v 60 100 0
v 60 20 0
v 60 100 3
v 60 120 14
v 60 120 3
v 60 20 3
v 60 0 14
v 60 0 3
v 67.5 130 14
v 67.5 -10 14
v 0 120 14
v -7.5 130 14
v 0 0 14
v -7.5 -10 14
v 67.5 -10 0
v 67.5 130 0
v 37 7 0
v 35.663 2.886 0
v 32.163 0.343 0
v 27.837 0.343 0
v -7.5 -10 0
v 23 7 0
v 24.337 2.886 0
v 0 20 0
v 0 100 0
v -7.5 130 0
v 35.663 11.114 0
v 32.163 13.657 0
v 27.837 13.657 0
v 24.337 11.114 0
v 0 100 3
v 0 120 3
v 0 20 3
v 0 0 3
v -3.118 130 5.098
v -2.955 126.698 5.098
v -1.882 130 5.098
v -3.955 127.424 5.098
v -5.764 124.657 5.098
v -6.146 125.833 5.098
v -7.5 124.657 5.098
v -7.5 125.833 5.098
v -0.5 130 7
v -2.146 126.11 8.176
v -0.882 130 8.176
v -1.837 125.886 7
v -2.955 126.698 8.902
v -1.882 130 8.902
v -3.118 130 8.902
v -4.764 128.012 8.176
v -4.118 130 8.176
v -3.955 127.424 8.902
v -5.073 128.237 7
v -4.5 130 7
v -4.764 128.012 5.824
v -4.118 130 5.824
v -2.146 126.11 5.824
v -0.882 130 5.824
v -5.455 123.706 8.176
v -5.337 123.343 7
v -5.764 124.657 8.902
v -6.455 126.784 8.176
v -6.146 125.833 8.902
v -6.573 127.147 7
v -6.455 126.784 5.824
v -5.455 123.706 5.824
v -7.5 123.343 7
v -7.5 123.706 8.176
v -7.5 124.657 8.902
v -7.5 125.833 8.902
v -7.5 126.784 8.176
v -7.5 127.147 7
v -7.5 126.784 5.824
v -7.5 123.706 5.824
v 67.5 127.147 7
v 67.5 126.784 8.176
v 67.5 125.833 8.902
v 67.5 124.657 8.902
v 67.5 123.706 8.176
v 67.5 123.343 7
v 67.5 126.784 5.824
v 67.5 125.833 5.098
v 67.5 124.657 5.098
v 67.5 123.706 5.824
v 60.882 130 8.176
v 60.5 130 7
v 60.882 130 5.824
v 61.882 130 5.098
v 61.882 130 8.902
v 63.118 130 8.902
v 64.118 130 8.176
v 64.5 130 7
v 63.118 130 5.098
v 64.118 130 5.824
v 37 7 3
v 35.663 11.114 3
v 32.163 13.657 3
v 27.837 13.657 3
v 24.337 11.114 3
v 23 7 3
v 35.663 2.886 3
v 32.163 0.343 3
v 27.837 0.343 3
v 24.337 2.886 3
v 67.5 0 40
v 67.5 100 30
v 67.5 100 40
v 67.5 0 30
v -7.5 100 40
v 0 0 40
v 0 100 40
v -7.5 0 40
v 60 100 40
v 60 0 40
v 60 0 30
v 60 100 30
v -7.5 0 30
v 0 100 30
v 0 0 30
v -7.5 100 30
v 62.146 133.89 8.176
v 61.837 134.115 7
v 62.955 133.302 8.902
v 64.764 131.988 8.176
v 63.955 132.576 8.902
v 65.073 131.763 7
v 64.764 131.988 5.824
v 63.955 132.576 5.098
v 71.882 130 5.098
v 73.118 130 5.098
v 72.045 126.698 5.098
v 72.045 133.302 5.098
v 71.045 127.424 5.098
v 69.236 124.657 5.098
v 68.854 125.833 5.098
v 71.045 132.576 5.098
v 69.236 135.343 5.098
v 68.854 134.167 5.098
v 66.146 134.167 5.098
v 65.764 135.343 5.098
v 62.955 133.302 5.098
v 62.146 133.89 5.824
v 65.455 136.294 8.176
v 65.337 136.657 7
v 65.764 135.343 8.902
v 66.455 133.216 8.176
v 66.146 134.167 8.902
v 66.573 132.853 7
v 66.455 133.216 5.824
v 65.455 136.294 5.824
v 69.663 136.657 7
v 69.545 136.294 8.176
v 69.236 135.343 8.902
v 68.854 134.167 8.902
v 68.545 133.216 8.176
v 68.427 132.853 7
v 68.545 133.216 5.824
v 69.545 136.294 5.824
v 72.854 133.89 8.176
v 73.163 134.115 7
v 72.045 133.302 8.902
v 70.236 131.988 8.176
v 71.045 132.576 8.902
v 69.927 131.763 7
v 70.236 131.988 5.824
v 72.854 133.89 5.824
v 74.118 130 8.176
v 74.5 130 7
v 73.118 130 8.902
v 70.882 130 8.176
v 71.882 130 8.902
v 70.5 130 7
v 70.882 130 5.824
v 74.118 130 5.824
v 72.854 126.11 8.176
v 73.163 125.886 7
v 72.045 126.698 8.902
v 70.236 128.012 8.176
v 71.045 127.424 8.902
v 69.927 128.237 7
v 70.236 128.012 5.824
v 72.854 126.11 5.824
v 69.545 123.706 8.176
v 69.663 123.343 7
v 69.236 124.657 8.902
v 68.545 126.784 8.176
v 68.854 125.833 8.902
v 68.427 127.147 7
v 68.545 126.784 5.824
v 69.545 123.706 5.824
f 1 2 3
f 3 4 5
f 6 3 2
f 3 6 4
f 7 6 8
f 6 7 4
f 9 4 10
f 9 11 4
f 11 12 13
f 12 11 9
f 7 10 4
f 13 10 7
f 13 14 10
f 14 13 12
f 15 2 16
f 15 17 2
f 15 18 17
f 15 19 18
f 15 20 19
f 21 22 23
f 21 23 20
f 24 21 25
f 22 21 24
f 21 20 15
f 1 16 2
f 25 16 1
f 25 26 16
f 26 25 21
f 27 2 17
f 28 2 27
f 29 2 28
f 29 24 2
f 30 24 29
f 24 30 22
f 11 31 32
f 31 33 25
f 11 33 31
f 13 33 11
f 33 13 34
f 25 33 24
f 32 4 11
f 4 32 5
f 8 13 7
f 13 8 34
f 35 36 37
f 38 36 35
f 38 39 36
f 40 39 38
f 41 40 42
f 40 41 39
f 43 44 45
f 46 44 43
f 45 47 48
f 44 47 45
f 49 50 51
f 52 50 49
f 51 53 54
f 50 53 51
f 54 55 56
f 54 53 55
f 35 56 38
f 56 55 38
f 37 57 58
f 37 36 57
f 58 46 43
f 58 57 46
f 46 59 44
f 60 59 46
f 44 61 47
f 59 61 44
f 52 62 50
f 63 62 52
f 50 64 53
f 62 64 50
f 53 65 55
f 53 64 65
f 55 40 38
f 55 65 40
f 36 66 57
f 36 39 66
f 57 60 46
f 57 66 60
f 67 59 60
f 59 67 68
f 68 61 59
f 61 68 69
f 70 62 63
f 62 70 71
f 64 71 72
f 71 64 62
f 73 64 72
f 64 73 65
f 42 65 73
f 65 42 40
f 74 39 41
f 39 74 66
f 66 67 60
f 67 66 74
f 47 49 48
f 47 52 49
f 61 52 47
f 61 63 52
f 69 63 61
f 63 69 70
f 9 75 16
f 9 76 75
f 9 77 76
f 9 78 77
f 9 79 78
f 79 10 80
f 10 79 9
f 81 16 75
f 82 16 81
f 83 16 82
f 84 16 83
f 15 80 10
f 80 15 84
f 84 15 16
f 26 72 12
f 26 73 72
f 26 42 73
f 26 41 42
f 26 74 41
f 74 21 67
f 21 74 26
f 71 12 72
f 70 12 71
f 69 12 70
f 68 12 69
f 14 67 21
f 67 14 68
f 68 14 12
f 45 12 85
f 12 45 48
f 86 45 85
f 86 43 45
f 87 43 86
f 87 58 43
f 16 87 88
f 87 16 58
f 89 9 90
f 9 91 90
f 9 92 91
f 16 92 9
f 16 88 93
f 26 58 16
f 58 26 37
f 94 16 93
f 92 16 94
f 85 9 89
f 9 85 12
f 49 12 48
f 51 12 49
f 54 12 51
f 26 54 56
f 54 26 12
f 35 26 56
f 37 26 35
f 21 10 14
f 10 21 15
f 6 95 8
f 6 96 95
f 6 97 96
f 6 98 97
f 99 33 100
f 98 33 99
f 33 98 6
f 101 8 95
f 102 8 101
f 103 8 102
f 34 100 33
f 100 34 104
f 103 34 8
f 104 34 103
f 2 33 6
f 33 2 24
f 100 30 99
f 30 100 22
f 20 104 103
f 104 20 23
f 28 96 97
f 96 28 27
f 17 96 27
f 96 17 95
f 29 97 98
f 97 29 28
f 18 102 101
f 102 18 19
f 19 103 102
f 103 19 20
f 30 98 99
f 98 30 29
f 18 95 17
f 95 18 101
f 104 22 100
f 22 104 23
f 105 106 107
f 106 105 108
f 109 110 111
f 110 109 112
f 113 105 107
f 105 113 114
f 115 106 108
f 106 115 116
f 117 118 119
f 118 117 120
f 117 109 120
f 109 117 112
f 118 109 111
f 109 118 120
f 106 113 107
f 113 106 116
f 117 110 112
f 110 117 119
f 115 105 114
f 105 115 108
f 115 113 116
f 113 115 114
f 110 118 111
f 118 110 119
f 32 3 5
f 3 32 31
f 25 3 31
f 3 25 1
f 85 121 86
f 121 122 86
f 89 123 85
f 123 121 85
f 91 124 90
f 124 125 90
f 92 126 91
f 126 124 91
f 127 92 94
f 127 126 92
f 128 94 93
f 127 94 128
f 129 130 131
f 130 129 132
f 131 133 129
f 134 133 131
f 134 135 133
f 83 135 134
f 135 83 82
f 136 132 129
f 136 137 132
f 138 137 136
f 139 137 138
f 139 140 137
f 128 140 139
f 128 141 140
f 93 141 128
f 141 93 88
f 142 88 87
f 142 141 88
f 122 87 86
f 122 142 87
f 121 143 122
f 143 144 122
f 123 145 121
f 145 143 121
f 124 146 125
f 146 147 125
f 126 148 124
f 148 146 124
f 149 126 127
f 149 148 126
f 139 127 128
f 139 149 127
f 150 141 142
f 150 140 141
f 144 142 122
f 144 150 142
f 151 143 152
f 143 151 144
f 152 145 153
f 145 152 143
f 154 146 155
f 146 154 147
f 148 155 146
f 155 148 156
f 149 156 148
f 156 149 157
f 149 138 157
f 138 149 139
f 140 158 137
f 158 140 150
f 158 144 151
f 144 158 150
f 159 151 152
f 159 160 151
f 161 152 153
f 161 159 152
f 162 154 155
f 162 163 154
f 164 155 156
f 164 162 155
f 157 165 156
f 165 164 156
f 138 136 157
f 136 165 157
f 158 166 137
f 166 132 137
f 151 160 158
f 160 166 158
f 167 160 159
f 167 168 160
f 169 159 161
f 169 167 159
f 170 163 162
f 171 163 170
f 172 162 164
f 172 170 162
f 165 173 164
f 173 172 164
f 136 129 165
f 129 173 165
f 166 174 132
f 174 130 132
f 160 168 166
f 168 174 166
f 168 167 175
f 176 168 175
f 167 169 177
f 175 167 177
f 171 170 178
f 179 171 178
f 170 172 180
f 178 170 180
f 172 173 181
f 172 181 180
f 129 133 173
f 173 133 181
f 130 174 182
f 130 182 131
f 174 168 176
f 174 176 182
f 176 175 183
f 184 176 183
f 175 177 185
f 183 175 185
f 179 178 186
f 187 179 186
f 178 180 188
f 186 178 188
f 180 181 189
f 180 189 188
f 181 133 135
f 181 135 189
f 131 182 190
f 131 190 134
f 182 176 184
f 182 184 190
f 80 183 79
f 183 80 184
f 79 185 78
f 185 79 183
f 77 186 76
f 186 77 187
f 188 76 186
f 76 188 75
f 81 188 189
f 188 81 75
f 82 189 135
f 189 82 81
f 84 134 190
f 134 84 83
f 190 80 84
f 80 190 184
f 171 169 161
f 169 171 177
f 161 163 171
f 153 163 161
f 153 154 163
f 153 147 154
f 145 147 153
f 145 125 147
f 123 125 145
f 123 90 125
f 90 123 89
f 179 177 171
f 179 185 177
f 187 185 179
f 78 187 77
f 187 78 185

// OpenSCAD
//Chassis

difference() {

	translate([-7.5,-10,0]) {
	cube([75,140,14], center=false); //case
	}

union() {
cube([60,120,14], center=false); //phone

//Eyelet, Internal

translate([-7.5,130,7]) {
rotate_extrude(convexity = 10, $fn=10)
	translate([5,0,0])
		circle(r=2, $fn=10); 

}} //end eyelet

}

//Over-Covers


translate([-7.5,100,0]) { //top
cube([75,20,3]);
}

translate([-5,0,0]) { //bottom
	difference() {
		cube([65,20,3]);
	
		translate([35,7,2]) {
			cylinder(h=5, r=7,center=true, $fn=10);
		}
	

	}

}

//Eyelet, External

translate([67.5,130,7]) {
rotate_extrude(convexity = 10, $fn=10)
	translate([5,0,0])
		circle(r=2, $fn=10); 

}


//CardGroove

translate([-7.5,0,30]) {
	difference() {
		cube([75,100,10]);
		translate([7.5,0,0]) {
			cube([60,100,10]);
		}
	}
}

translate([-7.5,0,50]) {

polyhedron(points = [ 
[0,0,0],[0,0,20],[20,0,0],[0,20,0] ], 

triangles = [
[1,2,4],[1,3,4],[3,1,2],[4,3,2]],

convexity = 10);

}



//Notes
//We need an easy way to do subtractive booleans, because it's a bitch to make these cuts via nesting. Is it having a section for add and subtract, splitting it into functions, or perhaps having an invert so you can "add" a negative. No idea...
